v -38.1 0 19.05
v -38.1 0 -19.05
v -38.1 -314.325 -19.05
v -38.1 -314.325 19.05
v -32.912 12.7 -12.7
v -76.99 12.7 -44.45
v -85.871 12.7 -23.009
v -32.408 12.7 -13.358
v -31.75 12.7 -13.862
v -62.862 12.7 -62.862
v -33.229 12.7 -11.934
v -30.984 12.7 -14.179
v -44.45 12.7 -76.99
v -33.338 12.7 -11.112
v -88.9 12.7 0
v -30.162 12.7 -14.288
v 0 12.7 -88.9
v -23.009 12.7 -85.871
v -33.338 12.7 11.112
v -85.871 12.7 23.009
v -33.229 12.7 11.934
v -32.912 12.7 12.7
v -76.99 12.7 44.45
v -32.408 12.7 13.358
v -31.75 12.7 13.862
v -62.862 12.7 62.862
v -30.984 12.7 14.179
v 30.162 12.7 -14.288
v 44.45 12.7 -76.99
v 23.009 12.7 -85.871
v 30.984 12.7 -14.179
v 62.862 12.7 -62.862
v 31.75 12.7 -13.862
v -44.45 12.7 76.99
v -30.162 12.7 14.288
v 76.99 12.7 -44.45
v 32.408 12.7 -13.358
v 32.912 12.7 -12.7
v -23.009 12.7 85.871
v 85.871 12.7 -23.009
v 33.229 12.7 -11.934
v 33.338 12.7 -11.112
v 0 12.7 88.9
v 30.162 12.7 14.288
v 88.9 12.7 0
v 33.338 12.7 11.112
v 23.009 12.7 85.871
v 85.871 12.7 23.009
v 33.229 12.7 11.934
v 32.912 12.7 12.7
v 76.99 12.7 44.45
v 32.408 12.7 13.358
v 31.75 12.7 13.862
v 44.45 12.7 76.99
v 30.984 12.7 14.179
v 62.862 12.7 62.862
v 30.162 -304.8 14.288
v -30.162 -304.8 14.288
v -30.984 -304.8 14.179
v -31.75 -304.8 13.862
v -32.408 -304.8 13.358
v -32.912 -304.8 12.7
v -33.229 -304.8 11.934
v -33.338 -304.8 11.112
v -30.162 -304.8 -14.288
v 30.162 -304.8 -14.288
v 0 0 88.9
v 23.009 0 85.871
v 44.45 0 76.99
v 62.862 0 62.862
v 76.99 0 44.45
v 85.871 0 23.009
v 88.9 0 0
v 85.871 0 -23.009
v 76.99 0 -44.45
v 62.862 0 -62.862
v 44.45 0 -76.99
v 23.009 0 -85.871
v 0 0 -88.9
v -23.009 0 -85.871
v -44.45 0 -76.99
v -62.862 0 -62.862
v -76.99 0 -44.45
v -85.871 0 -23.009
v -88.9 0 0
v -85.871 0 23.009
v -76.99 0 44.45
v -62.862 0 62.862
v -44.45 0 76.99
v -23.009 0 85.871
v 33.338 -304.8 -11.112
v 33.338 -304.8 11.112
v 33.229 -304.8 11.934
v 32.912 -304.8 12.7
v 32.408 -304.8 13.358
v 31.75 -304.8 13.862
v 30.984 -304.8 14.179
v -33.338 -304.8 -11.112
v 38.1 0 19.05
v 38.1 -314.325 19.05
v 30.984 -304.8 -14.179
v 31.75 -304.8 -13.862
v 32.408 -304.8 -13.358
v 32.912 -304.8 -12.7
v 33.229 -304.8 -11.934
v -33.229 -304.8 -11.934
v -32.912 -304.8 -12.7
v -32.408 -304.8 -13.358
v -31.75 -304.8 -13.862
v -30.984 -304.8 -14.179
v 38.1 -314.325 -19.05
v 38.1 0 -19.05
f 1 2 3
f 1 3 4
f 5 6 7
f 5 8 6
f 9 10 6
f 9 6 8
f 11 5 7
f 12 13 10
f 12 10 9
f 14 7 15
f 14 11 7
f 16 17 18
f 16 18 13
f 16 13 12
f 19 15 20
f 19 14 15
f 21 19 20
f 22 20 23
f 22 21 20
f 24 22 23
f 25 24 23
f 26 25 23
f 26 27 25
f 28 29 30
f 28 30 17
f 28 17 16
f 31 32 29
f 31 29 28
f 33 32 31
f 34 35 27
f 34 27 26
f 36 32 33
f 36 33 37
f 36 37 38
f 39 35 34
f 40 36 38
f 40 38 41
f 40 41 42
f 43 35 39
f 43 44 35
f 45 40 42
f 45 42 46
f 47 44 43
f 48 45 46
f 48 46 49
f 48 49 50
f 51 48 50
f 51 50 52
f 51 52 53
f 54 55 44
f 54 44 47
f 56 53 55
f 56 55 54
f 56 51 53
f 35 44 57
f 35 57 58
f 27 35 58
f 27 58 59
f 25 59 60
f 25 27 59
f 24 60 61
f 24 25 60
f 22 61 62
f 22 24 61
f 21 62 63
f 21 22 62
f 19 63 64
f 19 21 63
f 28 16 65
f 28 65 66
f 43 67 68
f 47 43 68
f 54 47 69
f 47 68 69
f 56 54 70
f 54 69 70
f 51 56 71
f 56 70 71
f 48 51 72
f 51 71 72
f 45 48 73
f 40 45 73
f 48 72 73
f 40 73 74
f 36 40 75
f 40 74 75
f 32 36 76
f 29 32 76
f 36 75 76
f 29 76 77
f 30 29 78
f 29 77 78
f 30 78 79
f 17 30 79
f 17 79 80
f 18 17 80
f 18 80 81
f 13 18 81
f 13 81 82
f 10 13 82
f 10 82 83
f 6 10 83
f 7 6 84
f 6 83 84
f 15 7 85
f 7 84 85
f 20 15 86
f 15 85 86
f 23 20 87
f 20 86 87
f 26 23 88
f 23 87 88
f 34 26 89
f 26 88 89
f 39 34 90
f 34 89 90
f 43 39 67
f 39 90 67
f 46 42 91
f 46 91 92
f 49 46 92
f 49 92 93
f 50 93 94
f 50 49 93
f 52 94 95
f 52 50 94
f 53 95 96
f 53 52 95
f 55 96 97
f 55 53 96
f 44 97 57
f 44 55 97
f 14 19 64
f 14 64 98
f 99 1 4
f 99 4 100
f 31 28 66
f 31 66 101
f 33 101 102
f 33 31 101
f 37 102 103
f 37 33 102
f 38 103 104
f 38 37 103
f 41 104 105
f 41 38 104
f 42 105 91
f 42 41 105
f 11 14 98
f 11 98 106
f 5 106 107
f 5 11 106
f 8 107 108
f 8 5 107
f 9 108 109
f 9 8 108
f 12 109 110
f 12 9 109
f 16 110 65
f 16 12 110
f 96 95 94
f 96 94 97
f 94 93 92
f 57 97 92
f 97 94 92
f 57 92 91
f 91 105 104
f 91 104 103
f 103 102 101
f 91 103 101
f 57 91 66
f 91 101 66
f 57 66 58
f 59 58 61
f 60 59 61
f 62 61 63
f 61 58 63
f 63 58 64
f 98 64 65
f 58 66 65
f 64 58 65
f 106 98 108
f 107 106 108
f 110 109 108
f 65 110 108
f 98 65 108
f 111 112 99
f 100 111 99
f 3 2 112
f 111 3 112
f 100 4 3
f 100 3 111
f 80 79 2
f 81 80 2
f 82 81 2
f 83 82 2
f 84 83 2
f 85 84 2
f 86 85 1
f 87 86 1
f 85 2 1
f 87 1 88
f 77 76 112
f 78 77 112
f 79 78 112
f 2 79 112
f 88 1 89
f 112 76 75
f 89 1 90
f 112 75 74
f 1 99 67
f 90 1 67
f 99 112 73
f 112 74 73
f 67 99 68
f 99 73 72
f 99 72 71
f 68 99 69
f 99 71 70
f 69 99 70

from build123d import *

# Parameters (mm, degrees)
SKETCH1_R           = 88.9
BOSS_EXTRUDE1_DEPTH = 12.7
SKETCH2_W           = 76.2
SKETCH2_H           = 38.1
BOSS_EXTRUDE2_DEPTH = 314.325
CUT_EXTRUDE1_DEPTH  = 317.5


with BuildPart() as part:
    # Sketch1 → Boss-Extrude1 (new body)
    with BuildSketch(Plane(origin=(0, 0, 0), x_dir=(1, 0, 0), z_dir=(0, 1, 0))):
        with Locations(Location((0, 0, 0), (0, 0, 270))):
            Circle(SKETCH1_R)
    extrude(amount=BOSS_EXTRUDE1_DEPTH)

    # Sketch2 → Boss-Extrude2 (add)
    with BuildSketch(Plane.XZ):
        Rectangle(SKETCH2_W, SKETCH2_H)
    extrude(amount=BOSS_EXTRUDE2_DEPTH)

    # Sketch3 → Cut-Extrude1 (cut)
    with BuildSketch(Plane(origin=(0, 12.7, 0), x_dir=(1, 0, 0), z_dir=(0, 1, 0))):
        with BuildLine():
            Line((-30.1625, 14.2875), (30.1625, 14.2875))
            ThreePointArc((30.1625, 14.2875), (32.40756403, 13.35756403), (33.3375, 11.1125))
            Line((33.3375, 11.1125), (33.3375, -11.1125))
            ThreePointArc((33.3375, -11.1125), (32.40756403, -13.35756403), (30.1625, -14.2875))
            Line((30.1625, -14.2875), (-30.1625, -14.2875))
            ThreePointArc((-30.1625, -14.2875), (-32.40756403, -13.35756403), (-33.3375, -11.1125))
            Line((-33.3375, -11.1125), (-33.3375, 11.1125))
            ThreePointArc((-33.3375, 11.1125), (-32.40756403, 13.35756403), (-30.1625, 14.2875))
        make_face()
    extrude(amount=-CUT_EXTRUDE1_DEPTH, mode=Mode.SUBTRACT)


solid = part.part
